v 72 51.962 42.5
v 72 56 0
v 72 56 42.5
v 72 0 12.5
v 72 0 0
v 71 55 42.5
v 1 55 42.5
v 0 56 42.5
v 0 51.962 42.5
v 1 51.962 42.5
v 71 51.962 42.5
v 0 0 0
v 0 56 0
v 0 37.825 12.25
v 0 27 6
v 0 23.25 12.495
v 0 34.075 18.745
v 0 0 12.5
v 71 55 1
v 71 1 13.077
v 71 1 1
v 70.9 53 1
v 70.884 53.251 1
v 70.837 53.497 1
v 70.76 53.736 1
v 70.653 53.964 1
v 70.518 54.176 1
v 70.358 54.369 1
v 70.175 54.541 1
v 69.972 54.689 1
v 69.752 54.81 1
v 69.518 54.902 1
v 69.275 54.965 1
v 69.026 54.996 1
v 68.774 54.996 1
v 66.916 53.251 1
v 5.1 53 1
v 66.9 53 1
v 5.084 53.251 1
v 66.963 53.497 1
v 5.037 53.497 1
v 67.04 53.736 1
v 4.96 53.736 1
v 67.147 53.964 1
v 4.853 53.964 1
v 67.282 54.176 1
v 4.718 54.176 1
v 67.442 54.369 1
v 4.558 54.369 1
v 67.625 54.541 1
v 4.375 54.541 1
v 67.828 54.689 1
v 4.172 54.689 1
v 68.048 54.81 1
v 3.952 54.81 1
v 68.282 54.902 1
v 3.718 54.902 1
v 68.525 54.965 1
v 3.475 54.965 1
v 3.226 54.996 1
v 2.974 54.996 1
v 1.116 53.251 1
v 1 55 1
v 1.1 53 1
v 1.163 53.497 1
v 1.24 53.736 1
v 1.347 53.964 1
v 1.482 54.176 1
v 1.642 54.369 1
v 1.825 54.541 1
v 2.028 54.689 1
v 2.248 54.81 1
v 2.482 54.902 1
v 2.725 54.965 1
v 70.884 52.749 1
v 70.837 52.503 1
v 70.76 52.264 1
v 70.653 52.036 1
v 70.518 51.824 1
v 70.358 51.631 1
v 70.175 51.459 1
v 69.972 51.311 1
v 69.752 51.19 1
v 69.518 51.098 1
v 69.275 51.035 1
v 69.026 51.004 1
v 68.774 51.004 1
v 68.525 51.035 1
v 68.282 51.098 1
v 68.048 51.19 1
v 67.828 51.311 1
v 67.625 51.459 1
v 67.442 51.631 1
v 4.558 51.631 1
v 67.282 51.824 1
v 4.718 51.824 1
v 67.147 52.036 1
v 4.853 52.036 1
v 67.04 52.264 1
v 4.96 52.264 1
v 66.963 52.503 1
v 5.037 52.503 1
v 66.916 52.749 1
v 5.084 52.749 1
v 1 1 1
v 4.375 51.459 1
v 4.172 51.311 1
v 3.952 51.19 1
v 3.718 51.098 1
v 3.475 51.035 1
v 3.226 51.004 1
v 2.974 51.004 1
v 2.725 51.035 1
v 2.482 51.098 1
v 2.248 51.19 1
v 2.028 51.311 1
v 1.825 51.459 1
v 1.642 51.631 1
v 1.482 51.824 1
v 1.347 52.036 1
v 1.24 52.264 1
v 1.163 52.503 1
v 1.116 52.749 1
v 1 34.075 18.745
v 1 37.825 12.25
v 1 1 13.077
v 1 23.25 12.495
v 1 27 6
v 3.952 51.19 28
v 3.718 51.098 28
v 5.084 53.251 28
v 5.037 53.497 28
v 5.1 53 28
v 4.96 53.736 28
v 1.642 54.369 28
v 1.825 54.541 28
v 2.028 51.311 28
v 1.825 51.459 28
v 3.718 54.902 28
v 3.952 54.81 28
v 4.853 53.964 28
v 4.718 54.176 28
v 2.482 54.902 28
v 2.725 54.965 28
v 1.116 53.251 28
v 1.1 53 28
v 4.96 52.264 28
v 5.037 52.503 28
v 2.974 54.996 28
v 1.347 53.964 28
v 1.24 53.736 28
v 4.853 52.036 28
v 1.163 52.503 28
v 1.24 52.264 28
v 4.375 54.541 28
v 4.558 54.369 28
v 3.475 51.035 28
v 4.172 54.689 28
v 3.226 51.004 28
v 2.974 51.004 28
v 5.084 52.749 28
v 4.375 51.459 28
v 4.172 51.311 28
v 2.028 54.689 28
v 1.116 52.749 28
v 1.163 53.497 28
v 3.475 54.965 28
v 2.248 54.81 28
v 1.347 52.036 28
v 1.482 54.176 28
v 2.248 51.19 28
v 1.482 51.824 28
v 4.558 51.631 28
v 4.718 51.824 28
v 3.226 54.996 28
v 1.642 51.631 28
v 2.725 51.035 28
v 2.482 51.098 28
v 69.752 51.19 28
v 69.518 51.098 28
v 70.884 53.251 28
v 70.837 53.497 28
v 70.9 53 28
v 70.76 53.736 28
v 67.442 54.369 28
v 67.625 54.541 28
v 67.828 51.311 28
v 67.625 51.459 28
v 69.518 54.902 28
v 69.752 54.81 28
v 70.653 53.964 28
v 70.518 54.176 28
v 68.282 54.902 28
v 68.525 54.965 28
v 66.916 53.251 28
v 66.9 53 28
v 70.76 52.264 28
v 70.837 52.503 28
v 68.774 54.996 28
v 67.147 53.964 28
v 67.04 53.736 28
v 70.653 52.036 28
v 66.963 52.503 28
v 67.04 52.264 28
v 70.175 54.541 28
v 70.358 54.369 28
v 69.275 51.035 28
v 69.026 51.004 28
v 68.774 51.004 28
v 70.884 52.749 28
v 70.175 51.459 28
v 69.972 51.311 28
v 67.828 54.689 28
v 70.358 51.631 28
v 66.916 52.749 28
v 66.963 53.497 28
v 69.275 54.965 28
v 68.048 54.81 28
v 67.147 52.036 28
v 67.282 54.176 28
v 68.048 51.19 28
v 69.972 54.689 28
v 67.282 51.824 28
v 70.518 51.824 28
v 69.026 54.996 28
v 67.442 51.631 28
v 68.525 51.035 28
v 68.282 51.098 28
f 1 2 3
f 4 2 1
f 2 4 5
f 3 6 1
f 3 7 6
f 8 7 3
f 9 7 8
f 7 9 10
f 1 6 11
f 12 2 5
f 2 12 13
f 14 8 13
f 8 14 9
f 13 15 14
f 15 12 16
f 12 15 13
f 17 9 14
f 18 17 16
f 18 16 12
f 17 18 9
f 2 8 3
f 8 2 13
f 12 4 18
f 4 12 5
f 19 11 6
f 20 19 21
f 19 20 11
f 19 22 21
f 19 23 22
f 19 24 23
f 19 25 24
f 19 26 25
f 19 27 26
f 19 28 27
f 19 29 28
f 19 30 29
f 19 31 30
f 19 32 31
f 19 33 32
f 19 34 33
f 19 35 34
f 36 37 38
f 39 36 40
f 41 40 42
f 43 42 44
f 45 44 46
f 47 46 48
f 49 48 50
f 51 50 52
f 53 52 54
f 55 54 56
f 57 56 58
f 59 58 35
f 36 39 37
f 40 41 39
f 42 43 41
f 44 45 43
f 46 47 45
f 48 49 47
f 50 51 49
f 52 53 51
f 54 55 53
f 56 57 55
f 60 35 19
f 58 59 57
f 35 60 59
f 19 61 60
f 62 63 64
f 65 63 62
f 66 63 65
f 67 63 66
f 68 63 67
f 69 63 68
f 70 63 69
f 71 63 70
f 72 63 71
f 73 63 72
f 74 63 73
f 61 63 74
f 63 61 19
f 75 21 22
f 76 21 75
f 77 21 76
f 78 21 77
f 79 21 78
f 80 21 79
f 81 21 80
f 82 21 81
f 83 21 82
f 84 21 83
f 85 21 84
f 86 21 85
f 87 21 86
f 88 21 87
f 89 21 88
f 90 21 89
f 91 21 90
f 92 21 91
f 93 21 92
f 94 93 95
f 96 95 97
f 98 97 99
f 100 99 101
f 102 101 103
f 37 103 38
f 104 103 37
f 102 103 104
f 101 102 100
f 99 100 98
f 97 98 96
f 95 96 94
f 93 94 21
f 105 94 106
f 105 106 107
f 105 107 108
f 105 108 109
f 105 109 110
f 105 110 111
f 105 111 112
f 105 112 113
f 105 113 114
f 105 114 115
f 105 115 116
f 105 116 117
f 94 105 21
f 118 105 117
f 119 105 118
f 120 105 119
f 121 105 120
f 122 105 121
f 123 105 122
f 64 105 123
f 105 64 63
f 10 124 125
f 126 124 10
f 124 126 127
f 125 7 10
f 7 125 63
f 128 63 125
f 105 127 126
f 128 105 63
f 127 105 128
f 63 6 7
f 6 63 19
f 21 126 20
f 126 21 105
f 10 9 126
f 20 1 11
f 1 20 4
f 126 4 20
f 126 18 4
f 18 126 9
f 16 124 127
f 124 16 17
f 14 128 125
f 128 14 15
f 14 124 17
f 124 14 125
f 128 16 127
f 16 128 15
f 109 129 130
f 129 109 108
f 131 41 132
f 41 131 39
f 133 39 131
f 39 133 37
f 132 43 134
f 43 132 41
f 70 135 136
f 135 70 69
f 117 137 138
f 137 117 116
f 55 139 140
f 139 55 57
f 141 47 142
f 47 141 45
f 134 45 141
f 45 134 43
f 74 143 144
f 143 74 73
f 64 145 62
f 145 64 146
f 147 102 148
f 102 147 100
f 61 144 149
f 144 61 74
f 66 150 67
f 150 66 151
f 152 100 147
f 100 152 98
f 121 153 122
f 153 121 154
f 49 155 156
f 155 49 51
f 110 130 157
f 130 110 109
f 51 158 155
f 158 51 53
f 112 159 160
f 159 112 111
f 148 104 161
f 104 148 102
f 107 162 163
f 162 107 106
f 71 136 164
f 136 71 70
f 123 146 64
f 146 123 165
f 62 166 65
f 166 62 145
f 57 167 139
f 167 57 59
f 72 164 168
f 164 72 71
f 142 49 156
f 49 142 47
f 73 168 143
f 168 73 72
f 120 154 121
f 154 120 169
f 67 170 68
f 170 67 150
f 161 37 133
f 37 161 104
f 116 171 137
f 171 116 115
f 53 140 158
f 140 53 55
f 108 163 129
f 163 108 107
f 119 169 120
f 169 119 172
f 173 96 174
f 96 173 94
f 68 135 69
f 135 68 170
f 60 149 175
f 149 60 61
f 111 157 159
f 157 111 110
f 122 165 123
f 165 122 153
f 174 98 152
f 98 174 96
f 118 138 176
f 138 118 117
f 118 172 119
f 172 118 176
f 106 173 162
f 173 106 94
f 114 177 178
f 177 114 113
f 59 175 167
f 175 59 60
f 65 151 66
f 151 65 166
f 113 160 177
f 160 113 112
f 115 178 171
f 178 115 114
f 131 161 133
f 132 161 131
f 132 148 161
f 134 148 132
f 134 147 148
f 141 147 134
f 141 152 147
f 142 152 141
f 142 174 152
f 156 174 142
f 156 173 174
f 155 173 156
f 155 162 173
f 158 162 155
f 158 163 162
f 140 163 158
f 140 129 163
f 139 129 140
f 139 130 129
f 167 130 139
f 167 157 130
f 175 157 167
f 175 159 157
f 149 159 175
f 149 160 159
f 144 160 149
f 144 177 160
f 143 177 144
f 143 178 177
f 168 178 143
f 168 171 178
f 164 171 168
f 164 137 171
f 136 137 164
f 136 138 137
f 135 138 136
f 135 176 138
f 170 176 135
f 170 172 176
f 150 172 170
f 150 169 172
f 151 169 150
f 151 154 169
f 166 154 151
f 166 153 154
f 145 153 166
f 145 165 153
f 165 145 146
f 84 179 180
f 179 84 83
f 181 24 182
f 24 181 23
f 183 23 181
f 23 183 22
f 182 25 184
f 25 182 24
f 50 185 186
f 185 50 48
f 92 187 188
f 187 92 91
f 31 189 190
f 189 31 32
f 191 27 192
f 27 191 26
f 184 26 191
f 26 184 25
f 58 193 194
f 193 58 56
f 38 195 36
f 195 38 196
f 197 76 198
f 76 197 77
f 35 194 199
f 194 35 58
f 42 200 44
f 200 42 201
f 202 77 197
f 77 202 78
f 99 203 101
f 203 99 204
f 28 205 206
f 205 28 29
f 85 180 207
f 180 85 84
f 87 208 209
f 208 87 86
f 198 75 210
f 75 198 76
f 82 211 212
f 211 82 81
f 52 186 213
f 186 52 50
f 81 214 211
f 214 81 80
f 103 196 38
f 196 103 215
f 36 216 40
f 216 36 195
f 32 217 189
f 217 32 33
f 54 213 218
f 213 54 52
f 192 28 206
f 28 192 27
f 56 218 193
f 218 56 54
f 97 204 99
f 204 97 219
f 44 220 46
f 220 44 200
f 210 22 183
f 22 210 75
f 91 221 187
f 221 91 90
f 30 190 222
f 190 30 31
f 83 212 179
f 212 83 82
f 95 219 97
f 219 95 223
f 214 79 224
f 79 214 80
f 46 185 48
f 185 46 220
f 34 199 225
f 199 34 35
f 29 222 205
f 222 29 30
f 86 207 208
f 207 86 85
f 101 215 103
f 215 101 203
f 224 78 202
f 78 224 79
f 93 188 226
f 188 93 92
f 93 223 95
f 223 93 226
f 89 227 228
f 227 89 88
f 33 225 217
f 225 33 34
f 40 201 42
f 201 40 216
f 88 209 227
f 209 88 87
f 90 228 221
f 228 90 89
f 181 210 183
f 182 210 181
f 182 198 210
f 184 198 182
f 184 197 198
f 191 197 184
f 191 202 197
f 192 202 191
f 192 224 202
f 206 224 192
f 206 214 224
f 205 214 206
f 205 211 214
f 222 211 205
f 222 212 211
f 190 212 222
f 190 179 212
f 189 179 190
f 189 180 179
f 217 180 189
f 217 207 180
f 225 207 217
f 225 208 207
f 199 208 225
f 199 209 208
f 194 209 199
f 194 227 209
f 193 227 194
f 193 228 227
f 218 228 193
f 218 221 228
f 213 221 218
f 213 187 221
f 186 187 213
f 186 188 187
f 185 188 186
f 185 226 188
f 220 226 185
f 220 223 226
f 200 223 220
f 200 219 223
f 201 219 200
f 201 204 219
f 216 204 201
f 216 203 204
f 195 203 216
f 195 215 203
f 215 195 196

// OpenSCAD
$fn=50;
cm = 10;

in_w = 7*cm;
in_d = 5.4*cm;
wall = 1;

front_h = 1.25*cm;
back_h  = 4.25*cm;

post_dia = .40*cm;
post_rad = post_dia / 2;
post_h   = (back_h - 1.25*cm) - 3;
// a^2 + b^2 = c^2
// temp = front_h^2 + back_h^2;
// hyp = sqrt(temp);

plug_w = 1.25*cm;
plug_h = 0.75*cm;

difference () {
    box(in_w, in_d, back_h, wall);

    translate([-wall, 0, front_h])
        rotate([30, 0, 0])
            cube([in_w+(wall*4), in_d*1.2, back_h]);

    translate([-1, (in_d/2)-0, 6])
        rotate([30,0,0])
            cube([3, plug_w, plug_h]);
}

echo(str("PostRad = ", post_rad));
// left post
translate([wall + post_rad + 0.1, in_d-(post_rad/2), wall])
    cylinder(d=post_dia, h=post_h);

// right post
translate([(wall + in_w)-post_rad-.1, in_d-(post_rad/2), wall])
    cylinder(d=post_dia, h=post_h);


module box(w,d,h,wall=1) {
    difference() {
        cube([wall+w+wall,wall+d+wall,h]);

        translate([wall,wall,wall])
            cube([w,d,h]);
    }

}
